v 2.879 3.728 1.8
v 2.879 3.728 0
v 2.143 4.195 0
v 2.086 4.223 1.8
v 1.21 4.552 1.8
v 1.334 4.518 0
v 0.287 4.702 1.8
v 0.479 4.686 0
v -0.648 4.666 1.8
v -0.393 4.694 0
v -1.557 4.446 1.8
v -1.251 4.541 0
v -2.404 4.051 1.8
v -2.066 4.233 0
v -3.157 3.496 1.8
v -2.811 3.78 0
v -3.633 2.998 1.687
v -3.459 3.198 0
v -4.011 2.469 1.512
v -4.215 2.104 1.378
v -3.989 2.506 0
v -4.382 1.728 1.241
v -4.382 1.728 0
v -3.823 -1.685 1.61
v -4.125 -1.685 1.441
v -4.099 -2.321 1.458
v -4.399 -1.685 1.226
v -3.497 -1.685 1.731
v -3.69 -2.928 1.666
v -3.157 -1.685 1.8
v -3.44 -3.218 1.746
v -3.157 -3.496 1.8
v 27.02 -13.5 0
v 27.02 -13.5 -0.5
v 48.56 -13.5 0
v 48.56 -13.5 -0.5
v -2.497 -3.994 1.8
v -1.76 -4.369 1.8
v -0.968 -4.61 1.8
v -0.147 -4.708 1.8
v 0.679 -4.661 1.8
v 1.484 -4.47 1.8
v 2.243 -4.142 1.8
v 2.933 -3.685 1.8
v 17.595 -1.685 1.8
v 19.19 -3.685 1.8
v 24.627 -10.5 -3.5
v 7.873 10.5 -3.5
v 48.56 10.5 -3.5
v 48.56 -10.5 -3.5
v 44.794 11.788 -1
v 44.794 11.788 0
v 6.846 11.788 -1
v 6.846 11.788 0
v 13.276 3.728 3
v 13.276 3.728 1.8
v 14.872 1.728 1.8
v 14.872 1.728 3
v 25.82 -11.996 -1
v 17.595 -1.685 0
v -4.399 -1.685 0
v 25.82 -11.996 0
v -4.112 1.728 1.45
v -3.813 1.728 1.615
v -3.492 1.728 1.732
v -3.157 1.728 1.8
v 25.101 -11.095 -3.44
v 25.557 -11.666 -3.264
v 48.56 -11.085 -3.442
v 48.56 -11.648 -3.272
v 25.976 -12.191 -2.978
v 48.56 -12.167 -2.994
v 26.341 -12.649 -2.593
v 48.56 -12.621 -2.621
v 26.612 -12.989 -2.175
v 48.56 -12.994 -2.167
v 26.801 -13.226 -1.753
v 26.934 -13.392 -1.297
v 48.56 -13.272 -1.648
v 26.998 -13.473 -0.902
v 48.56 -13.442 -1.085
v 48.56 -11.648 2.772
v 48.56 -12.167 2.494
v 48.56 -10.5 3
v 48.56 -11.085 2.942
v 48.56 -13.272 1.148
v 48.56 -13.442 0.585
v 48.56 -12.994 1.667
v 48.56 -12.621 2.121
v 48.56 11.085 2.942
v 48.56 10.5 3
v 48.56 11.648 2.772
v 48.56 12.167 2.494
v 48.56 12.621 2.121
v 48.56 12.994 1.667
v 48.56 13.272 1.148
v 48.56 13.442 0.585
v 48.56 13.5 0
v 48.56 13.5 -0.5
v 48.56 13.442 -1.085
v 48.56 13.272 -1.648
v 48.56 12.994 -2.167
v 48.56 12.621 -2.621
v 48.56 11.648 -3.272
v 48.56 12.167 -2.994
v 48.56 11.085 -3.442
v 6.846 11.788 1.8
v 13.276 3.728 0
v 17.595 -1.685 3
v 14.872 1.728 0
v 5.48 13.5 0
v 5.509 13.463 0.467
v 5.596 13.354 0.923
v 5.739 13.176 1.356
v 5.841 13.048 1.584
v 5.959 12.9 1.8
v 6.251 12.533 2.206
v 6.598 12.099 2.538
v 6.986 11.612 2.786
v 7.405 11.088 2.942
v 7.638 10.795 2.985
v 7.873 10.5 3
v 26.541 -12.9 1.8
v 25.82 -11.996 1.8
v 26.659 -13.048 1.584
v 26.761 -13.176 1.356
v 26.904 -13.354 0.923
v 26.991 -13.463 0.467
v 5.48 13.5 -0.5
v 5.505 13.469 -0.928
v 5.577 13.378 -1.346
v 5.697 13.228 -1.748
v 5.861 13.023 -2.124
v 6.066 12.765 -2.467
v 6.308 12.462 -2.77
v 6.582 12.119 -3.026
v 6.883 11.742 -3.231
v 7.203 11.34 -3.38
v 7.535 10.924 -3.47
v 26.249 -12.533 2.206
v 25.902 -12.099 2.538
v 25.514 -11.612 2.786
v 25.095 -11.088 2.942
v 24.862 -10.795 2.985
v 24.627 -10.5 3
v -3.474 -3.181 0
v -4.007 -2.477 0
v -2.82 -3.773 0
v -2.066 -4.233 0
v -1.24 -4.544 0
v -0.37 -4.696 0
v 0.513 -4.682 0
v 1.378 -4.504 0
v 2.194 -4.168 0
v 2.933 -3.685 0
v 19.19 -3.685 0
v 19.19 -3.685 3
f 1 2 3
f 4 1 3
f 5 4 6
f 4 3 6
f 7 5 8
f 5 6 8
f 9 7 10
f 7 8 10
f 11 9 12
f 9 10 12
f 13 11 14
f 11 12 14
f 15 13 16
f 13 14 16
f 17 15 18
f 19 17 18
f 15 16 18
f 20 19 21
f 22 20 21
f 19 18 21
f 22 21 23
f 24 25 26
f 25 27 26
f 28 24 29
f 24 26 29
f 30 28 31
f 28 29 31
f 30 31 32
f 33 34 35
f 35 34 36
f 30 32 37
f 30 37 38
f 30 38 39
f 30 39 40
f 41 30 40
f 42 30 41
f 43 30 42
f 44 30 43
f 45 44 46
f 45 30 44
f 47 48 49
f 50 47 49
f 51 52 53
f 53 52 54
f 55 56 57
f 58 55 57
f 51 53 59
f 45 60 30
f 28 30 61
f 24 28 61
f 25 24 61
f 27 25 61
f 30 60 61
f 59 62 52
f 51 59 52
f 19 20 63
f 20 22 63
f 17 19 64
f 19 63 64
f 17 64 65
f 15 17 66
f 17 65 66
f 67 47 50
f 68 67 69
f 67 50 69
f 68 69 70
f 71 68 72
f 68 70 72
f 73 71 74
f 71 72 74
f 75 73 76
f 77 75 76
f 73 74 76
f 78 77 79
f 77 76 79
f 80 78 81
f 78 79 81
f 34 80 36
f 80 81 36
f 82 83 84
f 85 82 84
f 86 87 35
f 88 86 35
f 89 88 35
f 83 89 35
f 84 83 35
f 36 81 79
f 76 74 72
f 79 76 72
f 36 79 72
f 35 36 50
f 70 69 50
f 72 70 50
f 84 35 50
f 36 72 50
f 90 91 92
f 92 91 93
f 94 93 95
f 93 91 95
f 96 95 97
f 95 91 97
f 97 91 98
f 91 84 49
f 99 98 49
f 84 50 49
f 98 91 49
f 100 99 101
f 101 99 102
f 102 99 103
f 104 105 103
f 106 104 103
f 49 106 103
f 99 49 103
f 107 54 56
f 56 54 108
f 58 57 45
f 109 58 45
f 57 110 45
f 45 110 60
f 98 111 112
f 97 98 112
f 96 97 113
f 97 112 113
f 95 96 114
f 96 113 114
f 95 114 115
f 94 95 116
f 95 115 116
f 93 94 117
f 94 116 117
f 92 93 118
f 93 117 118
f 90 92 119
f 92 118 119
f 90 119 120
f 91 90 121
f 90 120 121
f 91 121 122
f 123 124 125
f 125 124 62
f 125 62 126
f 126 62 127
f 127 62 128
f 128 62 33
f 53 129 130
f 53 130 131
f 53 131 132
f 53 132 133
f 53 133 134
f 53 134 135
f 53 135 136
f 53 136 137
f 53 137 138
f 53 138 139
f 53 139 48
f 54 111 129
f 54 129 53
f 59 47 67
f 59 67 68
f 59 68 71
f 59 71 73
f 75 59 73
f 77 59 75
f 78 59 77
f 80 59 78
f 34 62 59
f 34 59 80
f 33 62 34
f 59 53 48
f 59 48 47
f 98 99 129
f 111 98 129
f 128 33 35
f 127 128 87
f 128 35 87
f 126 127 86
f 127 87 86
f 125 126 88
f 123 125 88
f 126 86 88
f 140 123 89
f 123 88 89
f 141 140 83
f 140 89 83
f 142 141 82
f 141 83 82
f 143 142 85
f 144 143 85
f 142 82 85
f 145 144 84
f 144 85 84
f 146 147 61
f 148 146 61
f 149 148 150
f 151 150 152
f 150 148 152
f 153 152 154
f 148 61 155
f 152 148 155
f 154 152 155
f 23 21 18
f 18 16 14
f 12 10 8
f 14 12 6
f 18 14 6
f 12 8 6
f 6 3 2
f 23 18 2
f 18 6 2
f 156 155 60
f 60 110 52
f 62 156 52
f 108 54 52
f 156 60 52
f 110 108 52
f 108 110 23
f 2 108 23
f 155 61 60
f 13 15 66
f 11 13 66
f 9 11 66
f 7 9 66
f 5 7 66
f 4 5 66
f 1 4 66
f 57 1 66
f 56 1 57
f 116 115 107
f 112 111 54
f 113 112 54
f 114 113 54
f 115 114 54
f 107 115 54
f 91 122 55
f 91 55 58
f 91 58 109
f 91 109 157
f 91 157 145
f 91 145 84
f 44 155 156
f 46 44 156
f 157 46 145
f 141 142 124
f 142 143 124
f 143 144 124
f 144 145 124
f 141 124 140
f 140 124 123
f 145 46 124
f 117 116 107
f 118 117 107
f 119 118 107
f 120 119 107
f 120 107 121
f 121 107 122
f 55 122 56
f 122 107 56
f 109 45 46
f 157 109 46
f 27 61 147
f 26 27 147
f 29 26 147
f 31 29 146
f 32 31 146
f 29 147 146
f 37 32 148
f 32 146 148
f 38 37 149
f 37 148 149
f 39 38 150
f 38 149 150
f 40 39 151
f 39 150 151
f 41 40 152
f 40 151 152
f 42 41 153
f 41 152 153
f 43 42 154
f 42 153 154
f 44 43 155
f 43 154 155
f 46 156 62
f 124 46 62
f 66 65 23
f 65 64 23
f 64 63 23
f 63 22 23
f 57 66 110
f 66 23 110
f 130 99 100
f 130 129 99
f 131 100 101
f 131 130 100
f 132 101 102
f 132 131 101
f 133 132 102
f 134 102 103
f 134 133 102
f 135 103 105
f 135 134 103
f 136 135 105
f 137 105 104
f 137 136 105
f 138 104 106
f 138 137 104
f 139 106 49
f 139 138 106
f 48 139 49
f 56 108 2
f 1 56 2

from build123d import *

# Parameters (mm, degrees)
F2_DEPTH  = 3.5
F4_DEPTH  = 1
F6_DEPTH  = 1.8
F8_DEPTH  = 1.2
F9_R      = 3
F11_DEPTH = 17.1864665007


with BuildPart() as f2:
    # F1 (on Top) → F2 (new body)
    with BuildSketch(Plane.XY):
        Polygon((48.5598316574, 13.5), (5.4801683426, 13.5), (27.0198316574, -13.5), align=None)
        Polygon((48.5598316574, 13.5), (27.0198316574, -13.5), (48.5598316574, -13.5), align=None)
    extrude(amount=-F2_DEPTH)

    # F3 (on Top) → F4 (cut)
    with BuildSketch(Plane.XY):
        Polygon((44.7943471372, 11.7882982132), (6.8457046456, 11.7882982132), (25.8198775993, -11.9958558036), align=None)
    extrude(amount=-F4_DEPTH, mode=Mode.SUBTRACT)

    # F5 (on face) → F6 (join)
    with BuildSketch(Plane.XY):
        with BuildLine():
            ThreePointArc((2.8793278964, 3.7278809202), (3.7658696299, 2.8294612951), (4.3820146982, 1.7278809202))
            Line((4.3820146982, 1.7278809202), (14.8715565456, 1.7278809202))
            Line((14.8715565456, 1.7278809202), (17.594606702, -1.6854665007))
            Line((17.594606702, -1.6854665007), (4.3985029231, -1.6854665007))
            ThreePointArc((4.3985029231, -1.6854665007), (3.7999051439, -2.783585132), (2.9334215452, -3.6854665007))
            Line((2.9334215452, -3.6854665007), (19.1901373179, -3.6854665007))
            Line((19.1901373179, -3.6854665007), (25.8198775993, -11.9958558036))
            Line((25.8198775993, -11.9958558036), (44.7943471372, 11.7882982132))
            Line((44.7943471372, 11.7882982132), (6.8457046456, 11.7882982132))
            Line((6.8457046456, 11.7882982132), (13.2760259297, 3.7278809202))
            Line((13.2760259297, 3.7278809202), (2.8793278964, 3.7278809202))
        make_face()
        Polygon((5.4801683426, 13.5), (6.8457046456, 11.7882982132), (44.7943471372, 11.7882982132), (25.8198775993, -11.9958558036), (27.0198316574, -13.5), (48.5598316574, 13.5), align=None)
        with BuildLine():
            Line((-4.3820146982, 1.7278809202), (4.3820146982, 1.7278809202))
            ThreePointArc((4.3820146982, 1.7278809202), (3.7658696299, 2.8294612951), (2.8793278964, 3.7278809202))
            ThreePointArc((2.8793278964, 3.7278809202), (-1.2508065023, 4.5412672663), (-4.3820146982, 1.7278809202))
        make_face()
        with BuildLine():
            ThreePointArc((2.9334215452, -3.6854665007), (3.7999051439, -2.783585132), (4.3985029231, -1.6854665007))
            Line((4.3985029231, -1.6854665007), (-4.3985029231, -1.6854665007))
            ThreePointArc((-4.3985029231, -1.6854665007), (-1.2396031062, -4.5443381728), (2.9334215452, -3.6854665007))
        make_face()
        Polygon((48.5598316574, 13.5), (27.0198316574, -13.5), (48.5598316574, -13.5), align=None)
    extrude(amount=F6_DEPTH)

    # F7 (on face) → F8 (join)
    with BuildSketch(Plane.XY.offset(1.8)):
        Polygon((48.5598316574, 13.5), (5.4801683426, 13.5), (13.2760259297, 3.7278809202), (14.8715565456, 1.7278809202), (17.594606702, -1.6854665007), (19.1901373179, -3.6854665007), (27.0198316574, -13.5), (48.5598316574, -13.5), align=None)
    extrude(amount=F8_DEPTH)

    # F9
    f9_edges = [f2.edges().sort_by_distance(p)[0] for p in [
        (27.02, 13.5, 3),
        (27.02, 13.5, -3.5),
        (37.789832, -13.5, 3),
        (37.789832, -13.5, -3.5),
    ]]
    fillet(f9_edges, radius=F9_R)

    # F10 (on face) → F11 (cut, through all)
    with BuildSketch(Plane.XZ.offset(3.6854665007)):
        with BuildLine():
            ThreePointArc((-4.430251196, 1.1966986349), (-3.7397455906, 1.6462971281), (-2.9335320779, 1.8164634239))
            Line((-2.9335320779, 1.8164634239), (-4.430251196, 1.8164634239))
            Line((-4.430251196, 1.8164634239), (-4.430251196, 1.1966986349))
        make_face()
    extrude(amount=-F11_DEPTH, mode=Mode.SUBTRACT)


solid = f2.part
